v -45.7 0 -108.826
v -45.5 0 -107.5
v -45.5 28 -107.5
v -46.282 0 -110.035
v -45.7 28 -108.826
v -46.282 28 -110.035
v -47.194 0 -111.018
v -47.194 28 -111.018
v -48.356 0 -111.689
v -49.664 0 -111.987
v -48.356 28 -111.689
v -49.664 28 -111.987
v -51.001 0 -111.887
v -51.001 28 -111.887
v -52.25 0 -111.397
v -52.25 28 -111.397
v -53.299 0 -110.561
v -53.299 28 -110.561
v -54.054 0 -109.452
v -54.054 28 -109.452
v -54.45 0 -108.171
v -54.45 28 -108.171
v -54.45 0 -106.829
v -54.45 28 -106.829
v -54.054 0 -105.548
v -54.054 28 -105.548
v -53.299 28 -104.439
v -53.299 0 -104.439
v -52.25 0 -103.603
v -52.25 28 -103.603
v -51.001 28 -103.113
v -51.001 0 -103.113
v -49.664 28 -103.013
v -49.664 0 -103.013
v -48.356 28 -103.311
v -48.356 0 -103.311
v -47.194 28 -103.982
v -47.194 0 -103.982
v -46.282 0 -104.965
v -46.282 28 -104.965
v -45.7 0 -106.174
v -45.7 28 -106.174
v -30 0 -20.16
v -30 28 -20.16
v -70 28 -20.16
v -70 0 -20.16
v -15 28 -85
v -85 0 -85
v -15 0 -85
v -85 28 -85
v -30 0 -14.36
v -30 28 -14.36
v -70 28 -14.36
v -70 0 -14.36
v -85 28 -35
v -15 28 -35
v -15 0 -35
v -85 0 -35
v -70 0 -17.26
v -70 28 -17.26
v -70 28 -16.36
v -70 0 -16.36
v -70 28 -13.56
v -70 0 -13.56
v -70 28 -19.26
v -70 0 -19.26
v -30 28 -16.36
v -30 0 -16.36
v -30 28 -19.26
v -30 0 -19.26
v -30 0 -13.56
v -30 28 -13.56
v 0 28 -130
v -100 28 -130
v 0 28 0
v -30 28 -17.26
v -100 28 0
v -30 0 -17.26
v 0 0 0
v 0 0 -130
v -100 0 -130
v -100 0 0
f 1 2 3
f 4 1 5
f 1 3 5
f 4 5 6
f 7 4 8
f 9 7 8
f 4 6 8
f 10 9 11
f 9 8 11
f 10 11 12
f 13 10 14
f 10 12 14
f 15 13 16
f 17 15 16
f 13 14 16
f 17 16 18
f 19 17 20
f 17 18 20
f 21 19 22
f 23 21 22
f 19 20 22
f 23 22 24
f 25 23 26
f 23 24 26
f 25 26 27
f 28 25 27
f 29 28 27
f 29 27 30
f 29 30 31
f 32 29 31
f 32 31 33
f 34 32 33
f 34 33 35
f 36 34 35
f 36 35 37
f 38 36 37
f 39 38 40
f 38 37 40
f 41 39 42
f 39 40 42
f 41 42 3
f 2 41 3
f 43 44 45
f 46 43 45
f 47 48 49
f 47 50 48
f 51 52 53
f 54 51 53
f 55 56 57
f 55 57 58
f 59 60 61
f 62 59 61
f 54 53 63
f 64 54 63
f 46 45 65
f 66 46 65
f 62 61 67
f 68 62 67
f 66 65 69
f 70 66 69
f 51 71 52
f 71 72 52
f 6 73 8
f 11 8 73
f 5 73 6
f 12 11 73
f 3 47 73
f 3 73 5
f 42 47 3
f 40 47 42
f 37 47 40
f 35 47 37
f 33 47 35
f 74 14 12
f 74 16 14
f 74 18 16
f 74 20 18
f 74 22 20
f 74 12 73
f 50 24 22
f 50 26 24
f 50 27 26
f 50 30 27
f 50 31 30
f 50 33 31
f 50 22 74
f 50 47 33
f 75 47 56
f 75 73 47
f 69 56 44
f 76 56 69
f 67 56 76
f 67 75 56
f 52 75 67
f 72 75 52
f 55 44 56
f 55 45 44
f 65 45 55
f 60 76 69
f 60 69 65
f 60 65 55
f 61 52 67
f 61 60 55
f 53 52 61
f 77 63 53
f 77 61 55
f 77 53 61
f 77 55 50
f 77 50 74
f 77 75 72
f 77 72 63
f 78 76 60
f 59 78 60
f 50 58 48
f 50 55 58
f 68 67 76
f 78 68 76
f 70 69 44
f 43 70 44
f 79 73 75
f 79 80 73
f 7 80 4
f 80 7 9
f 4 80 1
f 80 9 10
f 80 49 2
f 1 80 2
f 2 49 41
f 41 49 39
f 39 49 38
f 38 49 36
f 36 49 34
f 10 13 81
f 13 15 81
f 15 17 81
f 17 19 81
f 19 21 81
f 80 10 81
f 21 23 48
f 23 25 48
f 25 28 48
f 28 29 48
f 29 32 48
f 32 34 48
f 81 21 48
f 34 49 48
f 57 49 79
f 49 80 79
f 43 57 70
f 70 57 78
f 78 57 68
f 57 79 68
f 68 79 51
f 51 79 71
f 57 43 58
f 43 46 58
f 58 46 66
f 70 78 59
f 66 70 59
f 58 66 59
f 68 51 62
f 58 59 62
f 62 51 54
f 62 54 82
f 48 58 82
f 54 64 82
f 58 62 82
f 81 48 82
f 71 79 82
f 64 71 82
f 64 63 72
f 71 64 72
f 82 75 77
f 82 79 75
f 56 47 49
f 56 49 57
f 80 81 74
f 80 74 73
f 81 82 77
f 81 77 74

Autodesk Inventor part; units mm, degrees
ref_plane "YZ Plane" through (0, 0, 0) normal (1, 0, 0) x (0, 1, 0)
ref_plane "XZ Plane" through (0, 0, 0) normal (0, 1, 0) x (-1, 0, 0)
ref_plane "XY Plane" through (0, 0, 0) normal (0, 0, 1) x (1, 0, 0)
sketch "Boceto1" plane through (0, 0, 0) normal (0, 1, 0) x (-1, 0, 0)
  line L0 (0, 0) -> (100, 0)
  line L1 (100, 0) -> (100, -130)
  line L2 (100, -130) -> (0, -130)
  line L3 (0, -130) -> (0, 0)
  dimension "d0" = 100
  dimension "d1" = 130
extrude "Extrusión1" add sketch "Boceto1" along normal blind 28
sketch "Boceto2" plane through (0, 28, 0) normal (0, 1, 0) x (1, 0, 0)
  line L0 (-70, 13.56) -> (-30, 13.56)
  line L1 (-30, 13.56) -> (-30, 14.36)
  line L2 (-30, 14.36) -> (-70, 14.36)
  line L3 (-70, 14.36) -> (-70, 13.56)
  line L4 (-100, 0) -> (0, 0) projected
  line L5 (0, 0) -> (0, 130) projected
  line L6 (-70, 16.36) -> (-30, 16.36)
  line L7 (-30, 16.36) -> (-30, 17.26)
  line L8 (-30, 17.26) -> (-70, 17.26)
  line L9 (-70, 17.26) -> (-70, 16.36)
  line L10 (-70, 19.26) -> (-30, 19.26)
  line L11 (-30, 19.26) -> (-30, 20.16)
  line L12 (-30, 20.16) -> (-70, 20.16)
  line L13 (-70, 20.16) -> (-70, 19.26)
  line L14 (-85, 85) -> (-15, 85)
  line L15 (-15, 85) -> (-15, 35)
  line L16 (-15, 35) -> (-85, 35)
  line L17 (-85, 35) -> (-85, 85)
  line L18 (-100, 130) -> (-100, 0) projected
  line L19 (0, 130) -> (-100, 130) projected
  circle A0 centre (-50, 107.5) radius 4.5
  dimension "d4" = 40
  dimension "d5" = 0.8
  dimension "d6" = 13.56
  dimension "d7" = 30
  dimension "d8" = 40
  dimension "d9" = 0.9
  dimension "d10" = 2
  dimension "d11" = 0
  dimension "d12" = 40
  dimension "d13" = 0.9
  dimension "d14" = 0
  dimension "d15" = 2
  dimension "d16" = 70
  dimension "d17" = 50
  dimension "d18" = 15
  dimension "d19" = 45
  dimension "d20" = 9
  dimension "d21" = 50
  dimension "d22" = 22.5
extrude "Extrusión2" cut sketch "Boceto2" against normal blind 28 contours L3 L2 L1 L0 | L9 L8 L7 L6 | L13 L12 L11 L10 | L14 L15 L16 L17 | A0
equation "\"Radio_pliegue\" = Grosor"
equation "\"Anchura_desahogo_plegado\" = Grosor"
equation "\"Profundidad_desahogo_plegado\" = 0.5 * Grosor"
equation "\"Tamaño_destalonado\" = 4 * Grosor"
equation "\"Remanente_mínimo\" = 2 * Grosor"
equation "\"Radiodetransición\" = Radio_pliegue"
equation "\"Tamaño_de_radio_de_Jacobi\" = Radio_pliegue"
equation "\"TamañoSeparación\" = Grosor"
equation "\"Grosor\" = 0.5"
properties part number "carcasaV1"
